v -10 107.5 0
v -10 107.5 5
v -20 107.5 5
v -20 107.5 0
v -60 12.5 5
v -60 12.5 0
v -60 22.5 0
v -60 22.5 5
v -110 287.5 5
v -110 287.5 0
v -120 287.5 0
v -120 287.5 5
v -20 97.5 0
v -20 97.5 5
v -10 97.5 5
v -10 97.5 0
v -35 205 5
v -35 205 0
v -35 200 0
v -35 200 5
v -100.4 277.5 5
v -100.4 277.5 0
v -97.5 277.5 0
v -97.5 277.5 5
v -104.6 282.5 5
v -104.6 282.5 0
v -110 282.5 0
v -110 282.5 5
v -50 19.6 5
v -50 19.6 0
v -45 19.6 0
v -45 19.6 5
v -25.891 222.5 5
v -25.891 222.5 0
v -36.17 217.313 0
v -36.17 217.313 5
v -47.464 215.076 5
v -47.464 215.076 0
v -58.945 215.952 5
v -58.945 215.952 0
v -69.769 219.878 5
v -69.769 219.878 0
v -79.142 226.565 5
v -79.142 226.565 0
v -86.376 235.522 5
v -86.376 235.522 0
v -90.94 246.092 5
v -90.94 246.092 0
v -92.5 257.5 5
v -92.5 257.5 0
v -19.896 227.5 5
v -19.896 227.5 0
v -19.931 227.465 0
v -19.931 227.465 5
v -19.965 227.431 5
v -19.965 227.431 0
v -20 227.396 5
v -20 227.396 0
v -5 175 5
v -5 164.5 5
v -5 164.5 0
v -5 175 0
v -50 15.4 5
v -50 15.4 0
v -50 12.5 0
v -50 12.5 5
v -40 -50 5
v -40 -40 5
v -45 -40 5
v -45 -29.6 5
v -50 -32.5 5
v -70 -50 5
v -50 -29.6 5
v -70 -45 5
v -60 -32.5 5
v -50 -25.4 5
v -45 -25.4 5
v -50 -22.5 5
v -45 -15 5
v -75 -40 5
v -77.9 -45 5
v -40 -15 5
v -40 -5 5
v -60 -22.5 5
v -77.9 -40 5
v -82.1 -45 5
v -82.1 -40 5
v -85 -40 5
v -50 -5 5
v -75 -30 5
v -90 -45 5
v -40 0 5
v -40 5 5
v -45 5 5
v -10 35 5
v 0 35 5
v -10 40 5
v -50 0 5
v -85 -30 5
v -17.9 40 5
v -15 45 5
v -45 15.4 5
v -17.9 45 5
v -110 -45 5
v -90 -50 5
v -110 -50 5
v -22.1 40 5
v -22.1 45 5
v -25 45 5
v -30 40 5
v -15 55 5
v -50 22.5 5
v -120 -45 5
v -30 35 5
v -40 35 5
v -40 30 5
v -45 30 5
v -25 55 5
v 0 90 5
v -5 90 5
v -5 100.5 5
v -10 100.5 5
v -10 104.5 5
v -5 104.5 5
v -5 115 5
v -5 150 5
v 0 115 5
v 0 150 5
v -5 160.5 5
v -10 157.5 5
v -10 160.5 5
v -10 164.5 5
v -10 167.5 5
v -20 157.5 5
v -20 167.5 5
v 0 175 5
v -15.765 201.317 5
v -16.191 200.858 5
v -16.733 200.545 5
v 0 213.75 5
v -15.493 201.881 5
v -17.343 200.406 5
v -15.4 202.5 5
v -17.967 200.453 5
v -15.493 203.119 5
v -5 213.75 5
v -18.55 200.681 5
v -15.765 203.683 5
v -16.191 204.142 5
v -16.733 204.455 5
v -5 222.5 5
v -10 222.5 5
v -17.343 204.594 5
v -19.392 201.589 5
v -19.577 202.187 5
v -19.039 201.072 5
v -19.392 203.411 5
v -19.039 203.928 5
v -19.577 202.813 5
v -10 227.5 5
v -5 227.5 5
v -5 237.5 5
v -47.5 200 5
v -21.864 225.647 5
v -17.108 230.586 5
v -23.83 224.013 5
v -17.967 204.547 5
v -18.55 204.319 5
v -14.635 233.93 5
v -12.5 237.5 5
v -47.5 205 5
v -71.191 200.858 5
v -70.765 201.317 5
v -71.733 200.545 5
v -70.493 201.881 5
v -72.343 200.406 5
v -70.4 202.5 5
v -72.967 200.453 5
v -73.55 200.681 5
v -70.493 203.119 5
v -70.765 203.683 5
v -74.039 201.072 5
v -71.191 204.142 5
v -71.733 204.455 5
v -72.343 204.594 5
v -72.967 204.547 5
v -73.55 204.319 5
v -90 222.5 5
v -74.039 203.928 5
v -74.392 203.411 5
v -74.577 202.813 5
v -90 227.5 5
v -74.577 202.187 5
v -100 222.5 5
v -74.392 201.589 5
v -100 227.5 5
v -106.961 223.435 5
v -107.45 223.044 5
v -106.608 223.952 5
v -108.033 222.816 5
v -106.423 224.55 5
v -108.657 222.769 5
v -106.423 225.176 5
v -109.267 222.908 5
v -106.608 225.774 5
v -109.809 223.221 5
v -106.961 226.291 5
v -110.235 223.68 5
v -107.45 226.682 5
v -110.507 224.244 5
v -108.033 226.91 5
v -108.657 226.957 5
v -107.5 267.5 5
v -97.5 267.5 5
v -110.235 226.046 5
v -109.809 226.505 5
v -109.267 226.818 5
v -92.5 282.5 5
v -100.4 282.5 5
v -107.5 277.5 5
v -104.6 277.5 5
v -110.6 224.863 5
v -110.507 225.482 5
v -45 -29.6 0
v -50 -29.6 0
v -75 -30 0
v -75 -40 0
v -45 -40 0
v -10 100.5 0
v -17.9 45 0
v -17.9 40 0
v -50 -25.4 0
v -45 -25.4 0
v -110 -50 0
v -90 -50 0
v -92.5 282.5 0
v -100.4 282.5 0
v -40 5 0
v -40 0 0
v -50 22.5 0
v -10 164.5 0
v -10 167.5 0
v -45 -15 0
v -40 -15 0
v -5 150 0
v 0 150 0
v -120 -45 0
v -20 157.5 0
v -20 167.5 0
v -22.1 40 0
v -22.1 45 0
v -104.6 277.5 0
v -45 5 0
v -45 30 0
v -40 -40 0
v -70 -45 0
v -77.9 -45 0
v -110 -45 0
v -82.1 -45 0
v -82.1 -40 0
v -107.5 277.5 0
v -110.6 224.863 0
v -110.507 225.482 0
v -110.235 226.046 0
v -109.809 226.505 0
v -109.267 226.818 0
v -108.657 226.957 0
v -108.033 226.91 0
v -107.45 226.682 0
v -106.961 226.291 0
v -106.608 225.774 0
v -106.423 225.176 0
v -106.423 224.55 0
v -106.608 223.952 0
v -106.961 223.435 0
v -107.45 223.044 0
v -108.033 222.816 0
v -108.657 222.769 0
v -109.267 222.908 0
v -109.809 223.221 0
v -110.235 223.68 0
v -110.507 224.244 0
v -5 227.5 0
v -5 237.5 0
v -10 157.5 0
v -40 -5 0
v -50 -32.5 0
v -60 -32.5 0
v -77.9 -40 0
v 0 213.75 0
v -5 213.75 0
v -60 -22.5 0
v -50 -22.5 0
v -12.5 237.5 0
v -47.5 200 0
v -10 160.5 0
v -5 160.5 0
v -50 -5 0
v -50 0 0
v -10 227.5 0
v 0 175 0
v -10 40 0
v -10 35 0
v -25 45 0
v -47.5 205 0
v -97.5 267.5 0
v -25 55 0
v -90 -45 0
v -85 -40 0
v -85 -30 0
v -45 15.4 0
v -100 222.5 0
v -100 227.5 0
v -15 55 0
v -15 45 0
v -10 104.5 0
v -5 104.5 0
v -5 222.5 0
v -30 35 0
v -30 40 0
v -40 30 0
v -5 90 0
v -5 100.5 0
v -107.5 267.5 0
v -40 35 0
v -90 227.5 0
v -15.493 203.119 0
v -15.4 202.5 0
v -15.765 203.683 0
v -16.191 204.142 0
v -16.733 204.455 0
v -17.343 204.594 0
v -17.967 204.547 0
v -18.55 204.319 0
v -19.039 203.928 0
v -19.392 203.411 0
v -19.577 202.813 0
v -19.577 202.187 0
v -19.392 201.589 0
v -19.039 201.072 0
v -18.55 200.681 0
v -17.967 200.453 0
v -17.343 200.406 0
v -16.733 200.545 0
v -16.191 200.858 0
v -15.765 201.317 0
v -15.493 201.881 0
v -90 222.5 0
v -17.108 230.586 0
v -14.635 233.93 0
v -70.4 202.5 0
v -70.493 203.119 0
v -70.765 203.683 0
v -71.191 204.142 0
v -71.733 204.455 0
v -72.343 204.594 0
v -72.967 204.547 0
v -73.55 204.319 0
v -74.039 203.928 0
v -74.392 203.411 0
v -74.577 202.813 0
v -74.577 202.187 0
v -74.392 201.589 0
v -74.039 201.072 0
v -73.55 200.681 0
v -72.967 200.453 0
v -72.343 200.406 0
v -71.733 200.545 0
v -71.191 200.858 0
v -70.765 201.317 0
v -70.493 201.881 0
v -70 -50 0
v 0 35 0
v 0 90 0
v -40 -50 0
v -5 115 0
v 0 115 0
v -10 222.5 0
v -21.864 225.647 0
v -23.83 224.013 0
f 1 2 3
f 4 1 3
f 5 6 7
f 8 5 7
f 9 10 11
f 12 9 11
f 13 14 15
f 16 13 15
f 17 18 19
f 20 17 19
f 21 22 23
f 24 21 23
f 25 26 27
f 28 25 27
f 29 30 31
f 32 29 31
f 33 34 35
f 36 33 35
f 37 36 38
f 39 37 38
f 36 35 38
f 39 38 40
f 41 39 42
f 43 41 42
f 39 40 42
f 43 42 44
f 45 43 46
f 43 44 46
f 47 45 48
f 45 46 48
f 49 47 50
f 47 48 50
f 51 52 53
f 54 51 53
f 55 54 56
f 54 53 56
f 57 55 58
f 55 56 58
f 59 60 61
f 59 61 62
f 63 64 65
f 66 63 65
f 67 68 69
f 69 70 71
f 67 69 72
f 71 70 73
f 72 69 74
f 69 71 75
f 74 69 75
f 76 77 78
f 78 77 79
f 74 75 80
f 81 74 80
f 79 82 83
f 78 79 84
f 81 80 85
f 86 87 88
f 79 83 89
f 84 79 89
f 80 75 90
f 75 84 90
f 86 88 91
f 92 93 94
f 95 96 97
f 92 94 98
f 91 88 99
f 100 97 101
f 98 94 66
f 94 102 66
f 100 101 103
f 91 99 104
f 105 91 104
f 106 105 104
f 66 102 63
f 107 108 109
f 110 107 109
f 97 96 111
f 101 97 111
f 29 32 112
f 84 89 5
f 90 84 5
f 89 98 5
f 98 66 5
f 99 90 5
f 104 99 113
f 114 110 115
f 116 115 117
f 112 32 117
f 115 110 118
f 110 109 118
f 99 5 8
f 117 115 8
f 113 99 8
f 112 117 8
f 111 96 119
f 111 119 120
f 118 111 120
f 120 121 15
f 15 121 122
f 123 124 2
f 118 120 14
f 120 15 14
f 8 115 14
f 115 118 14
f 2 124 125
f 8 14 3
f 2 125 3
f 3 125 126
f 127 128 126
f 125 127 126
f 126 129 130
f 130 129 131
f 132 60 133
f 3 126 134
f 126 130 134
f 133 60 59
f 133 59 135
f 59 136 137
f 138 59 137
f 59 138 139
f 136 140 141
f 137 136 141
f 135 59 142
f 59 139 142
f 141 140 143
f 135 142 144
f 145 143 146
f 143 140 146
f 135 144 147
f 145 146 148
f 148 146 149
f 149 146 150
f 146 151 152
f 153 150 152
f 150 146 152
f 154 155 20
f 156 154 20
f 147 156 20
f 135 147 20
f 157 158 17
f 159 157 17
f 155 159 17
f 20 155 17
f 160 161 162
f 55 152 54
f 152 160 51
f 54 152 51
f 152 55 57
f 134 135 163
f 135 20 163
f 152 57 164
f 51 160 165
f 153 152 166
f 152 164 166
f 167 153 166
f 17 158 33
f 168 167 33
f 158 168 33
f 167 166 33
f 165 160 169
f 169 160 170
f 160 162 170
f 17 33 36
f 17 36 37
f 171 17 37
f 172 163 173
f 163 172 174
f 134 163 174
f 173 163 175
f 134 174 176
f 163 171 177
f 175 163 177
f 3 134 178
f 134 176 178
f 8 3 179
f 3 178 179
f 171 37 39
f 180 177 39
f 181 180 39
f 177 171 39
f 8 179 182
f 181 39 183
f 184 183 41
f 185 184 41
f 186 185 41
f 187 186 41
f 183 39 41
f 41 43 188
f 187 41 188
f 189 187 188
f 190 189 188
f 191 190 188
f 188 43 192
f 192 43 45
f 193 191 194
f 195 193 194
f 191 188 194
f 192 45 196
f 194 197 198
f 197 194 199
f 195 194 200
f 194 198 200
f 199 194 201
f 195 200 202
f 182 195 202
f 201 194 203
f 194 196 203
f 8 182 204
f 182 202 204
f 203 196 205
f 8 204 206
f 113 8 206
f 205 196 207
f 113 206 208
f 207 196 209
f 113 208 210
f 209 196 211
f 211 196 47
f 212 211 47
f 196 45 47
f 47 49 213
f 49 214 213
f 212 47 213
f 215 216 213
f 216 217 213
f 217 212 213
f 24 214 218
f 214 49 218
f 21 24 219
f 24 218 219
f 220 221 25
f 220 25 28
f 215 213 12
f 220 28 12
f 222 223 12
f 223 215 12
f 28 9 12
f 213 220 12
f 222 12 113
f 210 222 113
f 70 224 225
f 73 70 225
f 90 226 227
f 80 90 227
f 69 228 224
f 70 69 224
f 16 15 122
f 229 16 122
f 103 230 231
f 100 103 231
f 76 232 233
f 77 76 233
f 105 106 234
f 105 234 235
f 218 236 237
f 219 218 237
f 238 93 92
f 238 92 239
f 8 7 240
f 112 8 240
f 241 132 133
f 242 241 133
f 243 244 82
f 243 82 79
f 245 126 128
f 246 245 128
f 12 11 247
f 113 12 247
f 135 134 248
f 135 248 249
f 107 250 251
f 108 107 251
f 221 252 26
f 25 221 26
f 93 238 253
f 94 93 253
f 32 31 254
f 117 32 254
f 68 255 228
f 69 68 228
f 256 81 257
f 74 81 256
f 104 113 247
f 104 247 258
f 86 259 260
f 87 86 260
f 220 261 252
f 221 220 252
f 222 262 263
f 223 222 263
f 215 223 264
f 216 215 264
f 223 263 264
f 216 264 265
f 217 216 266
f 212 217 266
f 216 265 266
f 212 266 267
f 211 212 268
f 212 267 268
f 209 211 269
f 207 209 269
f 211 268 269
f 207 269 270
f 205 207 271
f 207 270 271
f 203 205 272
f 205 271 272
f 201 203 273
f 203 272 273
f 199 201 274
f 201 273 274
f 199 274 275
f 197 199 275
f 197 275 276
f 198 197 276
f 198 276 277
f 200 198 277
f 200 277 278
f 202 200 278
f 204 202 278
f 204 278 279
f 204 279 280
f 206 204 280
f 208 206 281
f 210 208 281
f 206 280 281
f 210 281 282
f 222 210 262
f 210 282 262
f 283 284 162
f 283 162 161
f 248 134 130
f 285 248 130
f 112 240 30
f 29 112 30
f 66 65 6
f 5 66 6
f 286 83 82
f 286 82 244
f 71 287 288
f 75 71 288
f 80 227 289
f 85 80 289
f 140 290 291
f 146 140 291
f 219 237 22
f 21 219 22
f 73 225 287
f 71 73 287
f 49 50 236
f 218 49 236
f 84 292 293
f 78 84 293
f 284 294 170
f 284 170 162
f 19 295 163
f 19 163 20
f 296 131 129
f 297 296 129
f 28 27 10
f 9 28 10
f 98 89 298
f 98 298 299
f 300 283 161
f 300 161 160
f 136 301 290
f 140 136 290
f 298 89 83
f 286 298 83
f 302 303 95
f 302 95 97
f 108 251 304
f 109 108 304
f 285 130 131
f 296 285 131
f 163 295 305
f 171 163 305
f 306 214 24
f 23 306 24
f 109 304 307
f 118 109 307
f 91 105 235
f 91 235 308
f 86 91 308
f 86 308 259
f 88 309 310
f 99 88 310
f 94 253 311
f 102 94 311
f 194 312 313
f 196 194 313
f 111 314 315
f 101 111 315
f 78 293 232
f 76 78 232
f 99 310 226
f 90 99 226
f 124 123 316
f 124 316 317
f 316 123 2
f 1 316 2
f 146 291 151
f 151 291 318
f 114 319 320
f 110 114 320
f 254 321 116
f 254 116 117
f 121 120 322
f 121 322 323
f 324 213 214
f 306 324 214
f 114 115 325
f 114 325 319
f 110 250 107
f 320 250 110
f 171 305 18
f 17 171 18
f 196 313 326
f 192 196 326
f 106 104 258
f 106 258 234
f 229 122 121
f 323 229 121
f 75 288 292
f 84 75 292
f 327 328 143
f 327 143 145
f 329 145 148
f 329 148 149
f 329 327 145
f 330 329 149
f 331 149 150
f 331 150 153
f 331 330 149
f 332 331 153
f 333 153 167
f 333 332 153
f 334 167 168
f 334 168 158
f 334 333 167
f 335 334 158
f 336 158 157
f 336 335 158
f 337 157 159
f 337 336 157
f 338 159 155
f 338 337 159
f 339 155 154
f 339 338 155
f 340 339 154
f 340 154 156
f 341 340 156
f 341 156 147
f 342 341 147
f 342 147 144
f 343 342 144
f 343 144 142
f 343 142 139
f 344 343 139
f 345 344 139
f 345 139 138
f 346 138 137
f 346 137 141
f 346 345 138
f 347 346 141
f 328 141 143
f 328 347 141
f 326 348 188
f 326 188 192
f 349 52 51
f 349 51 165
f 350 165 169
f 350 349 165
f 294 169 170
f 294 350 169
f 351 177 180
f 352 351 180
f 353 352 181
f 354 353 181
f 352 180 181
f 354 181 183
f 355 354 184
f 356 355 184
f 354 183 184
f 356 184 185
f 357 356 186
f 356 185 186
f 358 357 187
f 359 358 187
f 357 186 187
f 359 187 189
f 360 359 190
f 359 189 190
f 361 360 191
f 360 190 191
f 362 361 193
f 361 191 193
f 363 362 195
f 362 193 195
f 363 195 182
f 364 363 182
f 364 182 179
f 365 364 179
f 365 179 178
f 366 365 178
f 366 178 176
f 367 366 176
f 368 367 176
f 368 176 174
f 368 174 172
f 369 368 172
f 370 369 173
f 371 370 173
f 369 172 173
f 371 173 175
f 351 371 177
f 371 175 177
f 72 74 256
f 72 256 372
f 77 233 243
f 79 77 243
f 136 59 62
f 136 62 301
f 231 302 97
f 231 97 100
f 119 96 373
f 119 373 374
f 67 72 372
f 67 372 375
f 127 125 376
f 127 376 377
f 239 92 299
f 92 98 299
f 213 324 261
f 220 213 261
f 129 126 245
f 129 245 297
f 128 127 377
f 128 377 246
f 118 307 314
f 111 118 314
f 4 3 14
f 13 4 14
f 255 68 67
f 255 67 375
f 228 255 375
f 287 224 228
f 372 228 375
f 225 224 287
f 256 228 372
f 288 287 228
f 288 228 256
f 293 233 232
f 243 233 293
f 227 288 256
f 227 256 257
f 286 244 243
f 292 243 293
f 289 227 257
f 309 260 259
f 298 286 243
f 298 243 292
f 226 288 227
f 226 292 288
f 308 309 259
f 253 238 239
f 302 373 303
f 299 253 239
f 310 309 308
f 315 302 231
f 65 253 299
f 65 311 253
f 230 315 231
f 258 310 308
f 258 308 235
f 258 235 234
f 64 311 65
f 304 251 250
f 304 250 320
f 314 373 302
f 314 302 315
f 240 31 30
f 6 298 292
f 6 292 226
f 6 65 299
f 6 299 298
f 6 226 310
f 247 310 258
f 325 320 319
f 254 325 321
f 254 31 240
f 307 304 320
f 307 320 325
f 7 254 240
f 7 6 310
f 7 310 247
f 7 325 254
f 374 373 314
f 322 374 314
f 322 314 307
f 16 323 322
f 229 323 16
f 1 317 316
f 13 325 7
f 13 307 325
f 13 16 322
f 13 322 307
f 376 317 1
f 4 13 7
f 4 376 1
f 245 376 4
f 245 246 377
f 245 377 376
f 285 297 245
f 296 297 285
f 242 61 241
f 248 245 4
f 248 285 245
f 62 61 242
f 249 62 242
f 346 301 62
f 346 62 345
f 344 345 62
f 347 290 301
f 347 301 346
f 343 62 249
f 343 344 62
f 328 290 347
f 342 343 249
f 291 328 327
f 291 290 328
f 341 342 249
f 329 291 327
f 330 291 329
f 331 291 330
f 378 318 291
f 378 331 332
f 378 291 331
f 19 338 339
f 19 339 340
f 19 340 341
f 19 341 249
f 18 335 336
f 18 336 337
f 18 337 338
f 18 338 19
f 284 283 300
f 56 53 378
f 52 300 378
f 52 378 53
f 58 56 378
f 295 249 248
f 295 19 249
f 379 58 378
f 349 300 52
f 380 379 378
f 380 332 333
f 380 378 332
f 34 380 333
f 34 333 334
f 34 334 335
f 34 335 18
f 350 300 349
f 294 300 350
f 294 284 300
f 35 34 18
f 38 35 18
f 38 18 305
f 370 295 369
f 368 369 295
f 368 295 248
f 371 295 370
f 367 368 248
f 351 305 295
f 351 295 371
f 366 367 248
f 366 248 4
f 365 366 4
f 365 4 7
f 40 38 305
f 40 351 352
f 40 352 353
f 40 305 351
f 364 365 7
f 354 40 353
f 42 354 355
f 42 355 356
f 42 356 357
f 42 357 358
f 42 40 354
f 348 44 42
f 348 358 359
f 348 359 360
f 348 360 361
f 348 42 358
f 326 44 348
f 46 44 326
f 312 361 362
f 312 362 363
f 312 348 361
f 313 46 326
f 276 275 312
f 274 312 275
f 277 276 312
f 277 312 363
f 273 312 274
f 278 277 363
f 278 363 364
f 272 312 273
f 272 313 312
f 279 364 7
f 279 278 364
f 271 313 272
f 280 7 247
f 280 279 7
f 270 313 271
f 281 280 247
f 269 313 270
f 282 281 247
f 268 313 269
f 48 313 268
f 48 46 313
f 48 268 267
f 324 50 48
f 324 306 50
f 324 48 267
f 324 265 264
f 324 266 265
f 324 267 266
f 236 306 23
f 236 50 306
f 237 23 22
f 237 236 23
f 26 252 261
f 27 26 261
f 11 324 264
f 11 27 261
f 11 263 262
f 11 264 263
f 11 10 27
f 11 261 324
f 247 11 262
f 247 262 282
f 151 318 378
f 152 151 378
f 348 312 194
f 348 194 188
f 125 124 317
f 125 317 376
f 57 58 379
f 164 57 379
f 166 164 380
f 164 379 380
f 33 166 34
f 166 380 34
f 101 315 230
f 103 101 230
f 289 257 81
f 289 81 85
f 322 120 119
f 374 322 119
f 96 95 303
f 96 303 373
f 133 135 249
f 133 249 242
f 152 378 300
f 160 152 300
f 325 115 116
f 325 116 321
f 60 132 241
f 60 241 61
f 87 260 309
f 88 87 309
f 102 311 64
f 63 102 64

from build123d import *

# Parameters (mm, degrees)
SKETCH1_W               = 150
SKETCH1_H               = 200
BOSS_EXTRUDE1_DEPTH     = 5
SKETCH2_W               = 45
SKETCH2_H               = 50
CUT_EXTRUDE1_DEPTH      = 10
SKETCH3_W               = 35
SKETCH3_H               = 5
BOSS_EXTRUDE2_DEPTH     = 5
SKETCH5_W               = 5
SKETCH5_H               = 45
BOSS_EXTRUDE3_DEPTH     = 5
SKETCH6_W               = 45
SKETCH6_H               = 15
BOSS_EXTRUDE4_DEPTH     = 5
SKETCH7_W               = 5
SKETCH7_H               = 25
SKETCH7_H_2             = 50
BOSS_EXTRUDE5_DEPTH     = 5
SKETCH8_W               = 35
SKETCH8_H               = 250
CUT_EXTRUDE3_DEPTH      = 10
SKETCH9_R               = 2.1
CUT_EXTRUDE4_DEPTH      = 5
BOSS_EXTRUDE6_DEPTH     = 5
CUT_EXTRUDE5_DEPTH      = 5
SKETCH12_W              = 4.2
SKETCH12_H              = 5
CUT_EXTRUDE6_DEPTH      = 5
SKETCH13_W              = 5
SKETCH13_H              = 35
SKETCH13_H_2            = 45
BOSS_EXTRUDE7_DEPTH     = 5
SKETCH14_W              = 5
SKETCH14_H              = 25
CUT_EXTRUDE7_DEPTH      = 5
SKETCH15_W              = 20
SKETCH15_H              = 5
CUT_EXTRUDE8_DEPTH      = 5
SKETCH16_W              = 5
SKETCH16_H              = 25
CUT_EXTRUDE9_DEPTH      = 5
BOSS_EXTRUDE8_START     = -5
BOSS_EXTRUDE8_OUTLINE_R = 2.1
BOSS_EXTRUDE8_OUTLINE_W = 10
BOSS_EXTRUDE8_OUTLINE_H = 5
BOSS_EXTRUDE8_DEPTH     = 5
SKETCH18_W              = 10
SKETCH18_H              = 10
SKETCH18_W_2            = 5
SKETCH18_H_2            = 4
CUT_EXTRUDE10_DEPTH     = 5
CUT_EXTRUDE11_DEPTH     = 10
SKETCH20_W              = 10
SKETCH20_H              = 1.8
CUT_EXTRUDE13_DEPTH     = 10
SKETCH21_R              = 42.5
SKETCH21_R_2            = 3
CUT_EXTRUDE14_DEPTH     = 5
BOSS_EXTRUDE9_DEPTH     = 5
BOSS_EXTRUDE10_DEPTH    = 5
SKETCH24_R              = 2.1
BOSS_EXTRUDE11_DEPTH    = 5
SKETCH25_R              = 2.1
CUT_EXTRUDE15_DEPTH     = 5


# Read off the part's stored shape, not the designer's step: Boss-Extrude8
with BuildPart() as part:
    # Sketch1 → Boss-Extrude1 (new body)
    with BuildSketch(Plane.XY):
        with Locations((-75, 100)):
            Rectangle(SKETCH1_W, SKETCH1_H)
    extrude(amount=BOSS_EXTRUDE1_DEPTH)

    # Sketch2 → Cut-Extrude1 (cut)
    with BuildSketch(Plane.XY.offset(5)):
        with Locations((-22.5, 25)):
            Rectangle(SKETCH2_W, SKETCH2_H)
    extrude(amount=-CUT_EXTRUDE1_DEPTH, mode=Mode.SUBTRACT)

    # Sketch3 → Boss-Extrude2 (add)
    with BuildSketch(Plane(origin=(0, 0, 0), x_dir=(-1, 0, 0), z_dir=(0, 0, -1))):
        with Locations((65, 202.5)):
            Rectangle(SKETCH3_W, SKETCH3_H)
    extrude(amount=-BOSS_EXTRUDE2_DEPTH)

    # Sketch5 → Boss-Extrude3 (add)
    with BuildSketch(Plane.XY.offset(5)):
        Polygon((-50, 0), (-150, 0), (-150, -50), (-130, -50), (-130, -45), (-110, -45), (-110, -50), (-90, -50), (-90, -45), (-70, -45), (-70, -50), (-50, -50), (-50, -5), align=None)
        with Locations((-47.5, -27.5)):
            Rectangle(SKETCH5_W, SKETCH5_H)
    extrude(amount=-BOSS_EXTRUDE3_DEPTH)

    # Sketch6 → Boss-Extrude4 (add)
    with BuildSketch(Plane.XY.offset(5)):
        with Locations((-22.5, 42.5)):
            Rectangle(SKETCH6_W, SKETCH6_H)
    extrude(amount=-BOSS_EXTRUDE4_DEPTH)

    # Sketch7 → Boss-Extrude5 (add)
    with BuildSketch(Plane(origin=(0, 0, 0), x_dir=(-1, 0, 0), z_dir=(0, 0, -1))):
        with Locations((152.5, 27.5)):
            Rectangle(SKETCH7_W, SKETCH7_H)
        with Locations((152.5, 130)):
            Rectangle(SKETCH7_W, SKETCH7_H_2)
    extrude(amount=-BOSS_EXTRUDE5_DEPTH)

    # Sketch8 → Cut-Extrude3 (cut)
    with BuildSketch(Plane(origin=(0, 0, 0), x_dir=(-1, 0, 0), z_dir=(0, 0, -1))):
        with Locations((137.5, 75)):
            Rectangle(SKETCH8_W, SKETCH8_H)
    extrude(amount=-CUT_EXTRUDE3_DEPTH, mode=Mode.SUBTRACT)

    # Sketch9 → Cut-Extrude4 (cut)
    with BuildSketch(Plane.XY.offset(5)):
        with Locations((-72.5, 202.5)):
            Circle(SKETCH9_R)
    extrude(amount=-CUT_EXTRUDE4_DEPTH, mode=Mode.SUBTRACT)

    # Sketch10 → Boss-Extrude6 (add)
    with BuildSketch(Plane.XY.offset(5)):
        with BuildLine():
            Line((-76.830127019, 205), (-68.169872981, 205))
            ThreePointArc((-68.169872981, 205), (-72.5, 207.5), (-76.830127019, 205))
        make_face()
    extrude(amount=-BOSS_EXTRUDE6_DEPTH)

    # Sketch11 → Cut-Extrude5 (cut)
    with BuildSketch(Plane(origin=(0, 0, 0), x_dir=(-1, 0, 0), z_dir=(0, 0, -1))):
        with BuildLine():
            Line((21.830127019, 200), (13.169872981, 200))
            ThreePointArc((13.169872981, 200), (17.5, 197.5), (21.830127019, 200))
        make_face()
    extrude(amount=-CUT_EXTRUDE5_DEPTH, mode=Mode.SUBTRACT)

    # Sketch12 → Cut-Extrude6 (cut)
    with BuildSketch(Plane(origin=(0, 0, 0), x_dir=(-1, 0, 0), z_dir=(0, 0, -1))):
        Polygon((75, -40), (77.9, -40), (82.1, -40), (85, -40), (85, -30), (75, -30), align=None)
        with Locations((80, -42.5)):
            Rectangle(SKETCH12_W, SKETCH12_H)
    extrude(amount=-CUT_EXTRUDE6_DEPTH, mode=Mode.SUBTRACT)

    # Sketch13 → Boss-Extrude7 (add)
    with BuildSketch(Plane(origin=(-45, 0, 0), x_dir=(0, 0, -1), z_dir=(1, 0, 0))):
        with Locations((-2.5, 17.5)):
            Rectangle(SKETCH13_W, SKETCH13_H)
        with Locations((-2.5, -27.5)):
            Rectangle(SKETCH13_W, SKETCH13_H_2)
    extrude(amount=BOSS_EXTRUDE7_DEPTH)

    # Sketch14 → Cut-Extrude7 (cut)
    with BuildSketch(Plane(origin=(0, 0, 0), x_dir=(-1, 0, 0), z_dir=(0, 0, -1))):
        with Locations((42.5, -27.5)):
            Rectangle(SKETCH14_W, SKETCH14_H)
        with Locations((42.5, 17.5)):
            Rectangle(SKETCH14_W, SKETCH14_H)
    extrude(amount=-CUT_EXTRUDE7_DEPTH, mode=Mode.SUBTRACT)

    # Sketch15 → Cut-Extrude8 (cut)
    with BuildSketch(Plane(origin=(0, 0, 0), x_dir=(-1, 0, 0), z_dir=(0, 0, -1))):
        with Locations((20, 37.5)):
            Rectangle(SKETCH15_W, SKETCH15_H)
    extrude(amount=-CUT_EXTRUDE8_DEPTH, mode=Mode.SUBTRACT)

    # Sketch16 → Cut-Extrude9 (cut)
    with BuildSketch(Plane.XY.offset(5)):
        with Locations((-2.5, 102.5)):
            Rectangle(SKETCH16_W, SKETCH16_H)
        with Locations((-2.5, 162.5)):
            Rectangle(SKETCH16_W, SKETCH16_H)
    extrude(amount=-CUT_EXTRUDE9_DEPTH, mode=Mode.SUBTRACT)

    # Boss-Extrude8 outline → Boss-Extrude8 (add)
    with BuildSketch(Plane.XY.offset(5).offset(BOSS_EXTRUDE8_START)):
        with BuildLine():
            Line((0, 200), (0, 213.75))
            Line((0, 213.75), (-5, 213.75))
            Line((-5, 213.75), (-5, 222.5))
            Line((-5, 222.5), (-10, 222.5))
            Line((-10, 222.5), (-10, 227.5))
            Line((-10, 227.5), (-20, 227.5))
            Line((-20, 227.5), (-20, 222.5))
            Line((-20, 222.5), (-28.711001812, 222.5))
            ThreePointArc((-28.711001812, 222.5), (-66.079667431, 219.821548079), (-90, 248.65571123))
            Line((-90, 248.65571123), (-90, 282.5))
            Line((-90, 282.5), (-100.4, 282.5))
            Line((-100.4, 282.5), (-100.4, 277.5))
            Line((-100.4, 277.5), (-97.5, 277.5))
            Line((-97.5, 277.5), (-97.5, 269.3))
            Line((-97.5, 269.3), (-107.5, 269.3))
            Line((-107.5, 269.3), (-107.5, 277.5))
            Line((-107.5, 277.5), (-104.6, 277.5))
            Line((-104.6, 277.5), (-104.6, 282.5))
            Line((-104.6, 282.5), (-110, 282.5))
            Line((-110, 282.5), (-110, 287.5))
            Line((-110, 287.5), (-120, 287.5))
            Line((-120, 287.5), (-120, 200))
            Line((-120, 200), (-82.5, 200))
            Line((-82.5, 200), (-82.5, 205))
            Line((-82.5, 205), (-76.830127019, 205))
            ThreePointArc((-76.830127019, 205), (-72.5, 207.5), (-68.169872981, 205))
            Line((-68.169872981, 205), (-35, 205))
            Line((-35, 205), (-35, 200))
            Line((-35, 200), (-21.830127019, 200))
            ThreePointArc((-21.830127019, 200), (-17.5, 197.5), (-13.169872981, 200))
            Line((-13.169872981, 200), (0, 200))
        make_face()
        with Locations((-115, 225)):
            Circle(BOSS_EXTRUDE8_OUTLINE_R, mode=Mode.SUBTRACT)
        with Locations((-95, 225)):
            Rectangle(BOSS_EXTRUDE8_OUTLINE_W, BOSS_EXTRUDE8_OUTLINE_H, mode=Mode.SUBTRACT)
        with Locations((-17.5, 202.5)):
            Circle(BOSS_EXTRUDE8_OUTLINE_R, mode=Mode.SUBTRACT)
    extrude(amount=BOSS_EXTRUDE8_DEPTH)

    # Sketch18 → Cut-Extrude10 (cut)
    with BuildSketch(Plane.XY.offset(5)):
        with Locations((-15, 162.5)):
            Rectangle(SKETCH18_W, SKETCH18_H)
        with Locations((-7.5, 162.5)):
            Rectangle(SKETCH18_W_2, SKETCH18_H_2)
        with Locations((-7.5, 102.5)):
            Rectangle(SKETCH18_W_2, SKETCH18_H_2)
        Polygon((-10, 100.5), (-10, 104.5), (-10, 107.5), (-20, 107.5), (-20, 97.5), (-10, 97.5), align=None)
    extrude(amount=-CUT_EXTRUDE10_DEPTH, mode=Mode.SUBTRACT)

    # Sketch19 → Cut-Extrude11 (cut)
    with BuildSketch(Plane(origin=(0, 0, 0), x_dir=(-1, 0, 0), z_dir=(0, 0, -1))):
        Polygon((45, -25.4), (45, -29.6), (50, -29.6), (50, -32.5), (60, -32.5), (60, -22.5), (50, -22.5), (50, -25.4), align=None)
        Polygon((50, 12.5), (60, 12.5), (60, 22.5), (50, 22.5), (50, 19.6), (45, 19.6), (45, 15.4), (50, 15.4), align=None)
        Polygon((17.9, 40), (22.1, 40), (22.1, 45), (25, 45), (25, 55), (15, 55), (15, 45), (17.9, 45), align=None)
    extrude(amount=-CUT_EXTRUDE11_DEPTH, mode=Mode.SUBTRACT)

    # Sketch20 → Cut-Extrude13 (cut)
    with BuildSketch(Plane.XY.offset(5)):
        with Locations((-102.5, 268.4)):
            Rectangle(SKETCH20_W, SKETCH20_H)
    extrude(amount=-CUT_EXTRUDE13_DEPTH, mode=Mode.SUBTRACT)

    # Sketch21 → Cut-Extrude14 (cut)
    # profile 1 of 2: a face of its own
    with BuildSketch(Plane(origin=(0, 0, 0), x_dir=(-1, 0, 0), z_dir=(0, 0, -1))):
        with BuildLine():
            ThreePointArc((84.369317712, 282.5), (90.41624675, 270.644466464), (92.5, 257.5))
            Line((92.5, 257.5), (92.5, 282.5))
            Line((92.5, 282.5), (84.369317712, 282.5))
        make_face()
    # profile 2 of 2: a face of its own
    with BuildSketch(Plane(origin=(0, 0, 0), x_dir=(-1, 0, 0), z_dir=(0, 0, -1))):
        with Locations((50, 257.5)):
            Circle(SKETCH21_R)
        with Locations((50, 257.5)):
            Circle(SKETCH21_R_2, mode=Mode.SUBTRACT)
    extrude(amount=-CUT_EXTRUDE14_DEPTH, mode=Mode.SUBTRACT)

    # Sketch22 → Boss-Extrude9 (add)
    with BuildSketch(Plane(origin=(0, 0, 0), x_dir=(-1, 0, 0), z_dir=(0, 0, -1))):
        with BuildLine():
            Line((20, 222.5), (20, 227.396013553))
            ThreePointArc((20, 227.396013553), (22.834909521, 224.815020892), (25.890873098, 222.5))
            Line((25.890873098, 222.5), (20, 222.5))
        make_face()
    extrude(amount=-BOSS_EXTRUDE9_DEPTH)

    # Sketch23 → Boss-Extrude10 (add)
    with BuildSketch(Plane(origin=(0, 0, 0), x_dir=(-1, 0, 0), z_dir=(0, 0, -1))):
        with BuildLine():
            ThreePointArc((19.896013553, 227.5), (15.830207114, 232.227974871), (12.5, 237.5))
            Line((12.5, 237.5), (5, 237.5))
            Line((5, 237.5), (5, 227.5))
            Line((5, 227.5), (19.896013553, 227.5))
        make_face()
    extrude(amount=-BOSS_EXTRUDE10_DEPTH)

    # Sketch24 → Boss-Extrude11 (add)
    with BuildSketch(Plane(origin=(0, 0, 0), x_dir=(-1, 0, 0), z_dir=(0, 0, -1))):
        with Locations((115, 225)):
            Circle(SKETCH24_R)
    extrude(amount=-BOSS_EXTRUDE11_DEPTH)

    # Sketch25 → Cut-Extrude15 (cut)
    with BuildSketch(Plane(origin=(0, 0, 0), x_dir=(-1, 0, 0), z_dir=(0, 0, -1))):
        with Locations((108.5, 224.863108965)):
            Circle(SKETCH25_R)
    extrude(amount=-CUT_EXTRUDE15_DEPTH, mode=Mode.SUBTRACT)


solid = part.part
